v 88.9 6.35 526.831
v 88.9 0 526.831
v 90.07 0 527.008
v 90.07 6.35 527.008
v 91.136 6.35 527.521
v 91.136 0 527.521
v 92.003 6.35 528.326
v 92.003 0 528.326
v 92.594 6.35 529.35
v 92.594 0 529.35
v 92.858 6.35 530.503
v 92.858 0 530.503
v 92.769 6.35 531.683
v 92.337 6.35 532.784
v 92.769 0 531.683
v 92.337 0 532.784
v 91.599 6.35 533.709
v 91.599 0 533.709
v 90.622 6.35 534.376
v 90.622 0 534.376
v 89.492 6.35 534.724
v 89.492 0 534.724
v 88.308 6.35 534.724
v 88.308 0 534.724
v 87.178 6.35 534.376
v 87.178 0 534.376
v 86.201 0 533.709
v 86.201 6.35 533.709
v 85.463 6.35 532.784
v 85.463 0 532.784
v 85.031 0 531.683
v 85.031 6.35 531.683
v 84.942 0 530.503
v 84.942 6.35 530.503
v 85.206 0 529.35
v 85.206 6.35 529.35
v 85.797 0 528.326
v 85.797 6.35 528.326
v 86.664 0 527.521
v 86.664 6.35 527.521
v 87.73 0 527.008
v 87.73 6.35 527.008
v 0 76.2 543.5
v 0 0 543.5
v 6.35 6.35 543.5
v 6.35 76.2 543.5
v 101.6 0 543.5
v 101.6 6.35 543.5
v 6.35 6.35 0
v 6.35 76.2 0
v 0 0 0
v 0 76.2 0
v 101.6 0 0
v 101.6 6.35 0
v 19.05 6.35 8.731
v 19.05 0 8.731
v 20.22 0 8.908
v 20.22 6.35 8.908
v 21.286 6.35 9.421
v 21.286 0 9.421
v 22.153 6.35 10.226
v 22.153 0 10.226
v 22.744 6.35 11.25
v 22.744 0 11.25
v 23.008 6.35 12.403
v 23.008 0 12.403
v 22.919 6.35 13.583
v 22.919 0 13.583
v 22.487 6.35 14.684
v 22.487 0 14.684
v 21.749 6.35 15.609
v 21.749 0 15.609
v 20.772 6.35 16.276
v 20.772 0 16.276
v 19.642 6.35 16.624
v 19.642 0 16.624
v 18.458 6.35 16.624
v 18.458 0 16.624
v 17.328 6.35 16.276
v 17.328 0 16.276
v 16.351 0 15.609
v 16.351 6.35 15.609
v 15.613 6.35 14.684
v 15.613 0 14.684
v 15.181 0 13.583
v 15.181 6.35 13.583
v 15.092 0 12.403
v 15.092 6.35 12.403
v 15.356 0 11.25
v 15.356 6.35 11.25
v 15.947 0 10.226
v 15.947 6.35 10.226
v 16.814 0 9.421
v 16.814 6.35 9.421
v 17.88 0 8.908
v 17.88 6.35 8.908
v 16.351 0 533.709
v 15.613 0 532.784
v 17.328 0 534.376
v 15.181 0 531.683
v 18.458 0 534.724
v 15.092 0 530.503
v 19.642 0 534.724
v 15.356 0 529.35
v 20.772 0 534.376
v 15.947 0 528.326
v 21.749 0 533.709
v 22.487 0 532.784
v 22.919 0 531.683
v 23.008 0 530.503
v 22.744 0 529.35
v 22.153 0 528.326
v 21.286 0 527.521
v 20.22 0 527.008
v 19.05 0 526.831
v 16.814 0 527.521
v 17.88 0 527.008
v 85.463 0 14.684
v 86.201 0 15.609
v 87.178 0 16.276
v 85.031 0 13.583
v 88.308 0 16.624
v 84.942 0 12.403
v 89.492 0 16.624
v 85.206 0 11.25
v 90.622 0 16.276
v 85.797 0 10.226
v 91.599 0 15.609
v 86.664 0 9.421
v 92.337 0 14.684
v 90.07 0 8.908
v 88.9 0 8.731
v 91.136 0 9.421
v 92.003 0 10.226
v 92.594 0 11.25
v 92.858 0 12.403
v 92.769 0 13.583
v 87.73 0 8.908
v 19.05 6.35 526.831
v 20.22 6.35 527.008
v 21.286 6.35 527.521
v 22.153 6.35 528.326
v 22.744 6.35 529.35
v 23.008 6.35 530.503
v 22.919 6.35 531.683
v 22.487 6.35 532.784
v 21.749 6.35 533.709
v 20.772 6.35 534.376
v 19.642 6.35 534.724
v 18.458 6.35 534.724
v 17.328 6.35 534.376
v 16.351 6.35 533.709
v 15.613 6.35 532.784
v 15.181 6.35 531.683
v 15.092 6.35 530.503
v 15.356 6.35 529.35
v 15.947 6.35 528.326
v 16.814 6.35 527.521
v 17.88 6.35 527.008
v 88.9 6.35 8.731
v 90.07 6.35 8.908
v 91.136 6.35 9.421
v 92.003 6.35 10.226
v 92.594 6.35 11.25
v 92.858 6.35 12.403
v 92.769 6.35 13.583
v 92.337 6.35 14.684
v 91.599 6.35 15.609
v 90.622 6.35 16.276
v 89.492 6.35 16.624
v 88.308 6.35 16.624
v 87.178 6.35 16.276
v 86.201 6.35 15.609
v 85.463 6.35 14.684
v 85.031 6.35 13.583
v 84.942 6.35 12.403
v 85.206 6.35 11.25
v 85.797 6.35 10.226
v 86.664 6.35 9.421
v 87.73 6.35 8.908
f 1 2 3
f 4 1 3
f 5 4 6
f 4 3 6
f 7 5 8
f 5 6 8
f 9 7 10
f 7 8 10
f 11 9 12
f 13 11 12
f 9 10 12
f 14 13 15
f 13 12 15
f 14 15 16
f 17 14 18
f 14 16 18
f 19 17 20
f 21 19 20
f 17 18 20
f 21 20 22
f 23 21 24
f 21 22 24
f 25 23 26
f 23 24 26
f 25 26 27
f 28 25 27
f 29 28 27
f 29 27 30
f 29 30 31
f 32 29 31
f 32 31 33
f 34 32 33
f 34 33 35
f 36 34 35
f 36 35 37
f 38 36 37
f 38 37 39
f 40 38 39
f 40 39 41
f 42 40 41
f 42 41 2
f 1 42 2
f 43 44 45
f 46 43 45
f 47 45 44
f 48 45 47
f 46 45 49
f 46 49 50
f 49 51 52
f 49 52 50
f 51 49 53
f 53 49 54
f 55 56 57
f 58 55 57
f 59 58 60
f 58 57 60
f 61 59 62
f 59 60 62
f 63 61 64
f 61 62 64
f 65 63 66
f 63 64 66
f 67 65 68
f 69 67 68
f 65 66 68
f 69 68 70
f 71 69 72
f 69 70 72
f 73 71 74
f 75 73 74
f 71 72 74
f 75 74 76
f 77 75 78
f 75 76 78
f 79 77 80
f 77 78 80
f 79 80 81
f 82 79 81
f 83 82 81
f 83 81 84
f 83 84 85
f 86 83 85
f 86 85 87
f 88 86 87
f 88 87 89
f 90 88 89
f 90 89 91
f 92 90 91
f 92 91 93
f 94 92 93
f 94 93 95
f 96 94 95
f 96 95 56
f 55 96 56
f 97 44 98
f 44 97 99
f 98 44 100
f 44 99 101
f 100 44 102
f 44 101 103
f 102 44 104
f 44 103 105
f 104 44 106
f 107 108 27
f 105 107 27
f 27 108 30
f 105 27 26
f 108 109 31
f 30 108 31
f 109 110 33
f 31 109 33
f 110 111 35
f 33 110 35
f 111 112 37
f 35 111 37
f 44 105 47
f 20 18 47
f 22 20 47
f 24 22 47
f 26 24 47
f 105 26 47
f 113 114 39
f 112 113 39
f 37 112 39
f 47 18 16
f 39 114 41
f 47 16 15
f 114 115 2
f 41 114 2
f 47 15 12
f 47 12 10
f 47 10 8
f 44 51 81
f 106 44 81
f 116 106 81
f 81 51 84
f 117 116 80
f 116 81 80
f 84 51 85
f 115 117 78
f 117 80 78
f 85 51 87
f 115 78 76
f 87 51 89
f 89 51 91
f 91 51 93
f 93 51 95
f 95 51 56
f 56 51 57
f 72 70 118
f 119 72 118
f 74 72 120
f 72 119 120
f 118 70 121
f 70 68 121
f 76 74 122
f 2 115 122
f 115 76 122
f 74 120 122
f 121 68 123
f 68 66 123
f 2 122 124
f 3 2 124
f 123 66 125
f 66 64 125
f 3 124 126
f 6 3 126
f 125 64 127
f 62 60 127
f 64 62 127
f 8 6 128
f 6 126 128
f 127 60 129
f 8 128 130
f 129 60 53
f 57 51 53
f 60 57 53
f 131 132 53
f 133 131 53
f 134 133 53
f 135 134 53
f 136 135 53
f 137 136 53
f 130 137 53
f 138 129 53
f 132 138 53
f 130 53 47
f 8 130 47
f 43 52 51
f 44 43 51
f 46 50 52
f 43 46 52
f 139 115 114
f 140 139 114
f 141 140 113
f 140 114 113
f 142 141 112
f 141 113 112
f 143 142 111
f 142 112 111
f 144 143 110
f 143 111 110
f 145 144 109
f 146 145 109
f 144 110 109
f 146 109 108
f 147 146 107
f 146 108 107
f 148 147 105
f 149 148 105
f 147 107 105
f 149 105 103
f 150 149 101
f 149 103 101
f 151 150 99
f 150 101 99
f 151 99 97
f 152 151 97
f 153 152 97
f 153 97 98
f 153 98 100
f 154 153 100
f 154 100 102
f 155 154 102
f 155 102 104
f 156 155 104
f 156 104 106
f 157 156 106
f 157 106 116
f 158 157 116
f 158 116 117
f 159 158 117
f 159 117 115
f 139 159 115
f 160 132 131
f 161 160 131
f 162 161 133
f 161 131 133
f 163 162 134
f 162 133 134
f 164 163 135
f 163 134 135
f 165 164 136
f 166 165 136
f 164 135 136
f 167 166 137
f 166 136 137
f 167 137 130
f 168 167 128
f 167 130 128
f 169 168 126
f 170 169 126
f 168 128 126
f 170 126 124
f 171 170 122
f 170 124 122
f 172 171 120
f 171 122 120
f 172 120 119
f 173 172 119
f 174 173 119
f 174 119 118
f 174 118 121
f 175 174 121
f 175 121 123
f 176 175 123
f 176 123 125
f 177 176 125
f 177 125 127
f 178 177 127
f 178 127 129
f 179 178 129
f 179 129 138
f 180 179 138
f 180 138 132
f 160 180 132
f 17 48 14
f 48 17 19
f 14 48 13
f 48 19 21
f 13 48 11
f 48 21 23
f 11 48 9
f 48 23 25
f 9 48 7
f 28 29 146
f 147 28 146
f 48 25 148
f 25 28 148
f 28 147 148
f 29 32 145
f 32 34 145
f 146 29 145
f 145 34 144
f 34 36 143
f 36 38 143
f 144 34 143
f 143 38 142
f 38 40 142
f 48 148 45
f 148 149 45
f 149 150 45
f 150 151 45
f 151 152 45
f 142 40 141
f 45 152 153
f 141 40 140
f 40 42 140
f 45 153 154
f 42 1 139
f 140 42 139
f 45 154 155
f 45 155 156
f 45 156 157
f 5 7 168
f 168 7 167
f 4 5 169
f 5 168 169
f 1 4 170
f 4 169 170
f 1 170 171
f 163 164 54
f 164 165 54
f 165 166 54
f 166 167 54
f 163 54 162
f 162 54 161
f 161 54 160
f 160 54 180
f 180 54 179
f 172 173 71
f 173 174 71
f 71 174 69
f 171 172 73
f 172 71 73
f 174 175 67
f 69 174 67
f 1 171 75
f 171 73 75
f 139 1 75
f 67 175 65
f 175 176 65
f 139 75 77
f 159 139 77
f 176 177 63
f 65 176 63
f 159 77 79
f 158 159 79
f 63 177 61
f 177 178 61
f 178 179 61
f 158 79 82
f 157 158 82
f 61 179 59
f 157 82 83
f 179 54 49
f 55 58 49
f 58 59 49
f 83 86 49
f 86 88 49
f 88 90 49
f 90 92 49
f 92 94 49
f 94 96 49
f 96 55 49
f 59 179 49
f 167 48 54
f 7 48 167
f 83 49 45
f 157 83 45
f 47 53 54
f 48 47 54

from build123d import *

# Parameters (mm, degrees)
BOSS_EXTRUDE1_DEPTH = 543.5
SKETCH4_R           = 3.96875
CUT_EXTRUDE1_DEPTH  = 559.140887232


with BuildPart() as part:
    # Sketch1 → Boss-Extrude1 (new body)
    with BuildSketch(Plane.XY):
        Polygon((0, 76.2), (0, 0), (101.6, 0), (101.6, 6.35), (6.35, 6.35), (6.35, 76.2), align=None)
    extrude(amount=BOSS_EXTRUDE1_DEPTH)

    # Sketch4 → Cut-Extrude1 (cut, through all)
    with BuildSketch(Plane.XZ):
        with Locations(Location((88.9, 530.8, 0), (0, 0, 270))):
            Circle(SKETCH4_R)
        with Locations(Location((19.05, 530.8, 0), (0, 0, 270))):
            Circle(SKETCH4_R)
        with Locations(Location((19.05, 12.7, 0), (0, 0, 270))):
            Circle(SKETCH4_R)
        with Locations(Location((88.9, 12.7, 0), (0, 0, 270))):
            Circle(SKETCH4_R)
    extrude(amount=-CUT_EXTRUDE1_DEPTH, mode=Mode.SUBTRACT)


solid = part.part
